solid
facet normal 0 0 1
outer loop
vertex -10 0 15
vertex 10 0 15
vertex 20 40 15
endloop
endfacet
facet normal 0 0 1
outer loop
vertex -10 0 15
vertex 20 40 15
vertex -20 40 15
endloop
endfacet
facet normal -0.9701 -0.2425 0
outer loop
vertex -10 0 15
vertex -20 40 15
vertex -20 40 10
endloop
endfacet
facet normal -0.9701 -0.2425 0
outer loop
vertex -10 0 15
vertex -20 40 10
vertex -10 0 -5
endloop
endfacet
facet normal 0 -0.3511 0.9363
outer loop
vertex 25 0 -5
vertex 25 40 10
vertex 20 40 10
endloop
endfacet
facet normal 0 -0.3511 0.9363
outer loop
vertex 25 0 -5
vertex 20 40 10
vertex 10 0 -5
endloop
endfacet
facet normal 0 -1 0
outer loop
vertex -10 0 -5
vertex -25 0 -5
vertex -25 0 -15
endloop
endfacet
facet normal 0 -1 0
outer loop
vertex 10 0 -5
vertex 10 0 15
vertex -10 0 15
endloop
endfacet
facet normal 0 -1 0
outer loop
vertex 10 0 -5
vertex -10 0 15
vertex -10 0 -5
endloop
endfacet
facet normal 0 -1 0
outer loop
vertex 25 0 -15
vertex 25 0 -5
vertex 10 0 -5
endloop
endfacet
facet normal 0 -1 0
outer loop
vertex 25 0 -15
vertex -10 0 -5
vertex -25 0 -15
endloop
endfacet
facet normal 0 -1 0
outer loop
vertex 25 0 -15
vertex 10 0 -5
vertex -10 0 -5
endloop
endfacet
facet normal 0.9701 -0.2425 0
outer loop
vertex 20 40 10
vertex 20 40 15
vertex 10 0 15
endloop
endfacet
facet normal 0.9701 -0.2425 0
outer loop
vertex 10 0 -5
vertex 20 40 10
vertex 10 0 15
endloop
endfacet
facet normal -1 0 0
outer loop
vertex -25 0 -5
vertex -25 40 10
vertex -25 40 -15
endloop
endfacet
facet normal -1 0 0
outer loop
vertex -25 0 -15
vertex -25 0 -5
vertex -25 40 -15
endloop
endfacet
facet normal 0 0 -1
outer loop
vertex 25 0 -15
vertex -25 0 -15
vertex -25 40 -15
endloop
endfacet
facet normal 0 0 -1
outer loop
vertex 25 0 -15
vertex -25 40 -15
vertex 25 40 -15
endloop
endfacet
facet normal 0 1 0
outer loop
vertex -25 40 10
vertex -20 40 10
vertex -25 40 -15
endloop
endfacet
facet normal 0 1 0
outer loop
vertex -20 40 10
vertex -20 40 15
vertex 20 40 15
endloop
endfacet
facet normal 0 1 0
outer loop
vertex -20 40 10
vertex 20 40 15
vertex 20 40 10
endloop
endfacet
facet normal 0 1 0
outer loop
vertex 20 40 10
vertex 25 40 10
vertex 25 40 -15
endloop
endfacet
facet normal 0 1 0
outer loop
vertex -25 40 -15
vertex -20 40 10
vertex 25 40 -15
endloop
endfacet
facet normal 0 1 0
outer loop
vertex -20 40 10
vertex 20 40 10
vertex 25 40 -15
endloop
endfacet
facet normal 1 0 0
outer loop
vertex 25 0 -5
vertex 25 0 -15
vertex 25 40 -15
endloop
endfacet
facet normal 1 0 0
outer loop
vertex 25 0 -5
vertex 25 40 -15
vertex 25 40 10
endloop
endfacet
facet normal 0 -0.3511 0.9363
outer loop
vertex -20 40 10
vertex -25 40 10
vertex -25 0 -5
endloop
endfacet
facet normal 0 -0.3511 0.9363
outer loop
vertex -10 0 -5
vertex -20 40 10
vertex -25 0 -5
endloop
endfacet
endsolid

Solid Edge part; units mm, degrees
sketch "Sketch1" plane through (0, 0, 0) normal (0, -1, 0) x (1, 0, 0)
  line L0 (10, 15) -> (-10, 15)
  line L1 (-10, -5) -> (-10, 15)
  line L2 (-10, -5) -> (-25, -5)
  line L3 (-25, -5) -> (-25, -15)
  line L4 (-25, -15) -> (25, -15)
  line L5 (25, -15) -> (25, -5)
  line L6 (10, -5) -> (25, -5)
  line L7 (10, -5) -> (10, 15)
extrude "Protrusion1" add sketch "Sketch1" against normal blind 40
sketch "Sketch2" plane through (25, 20, -10) normal (1, 0, 0) x (0, 1, 0)
  line L0 (20, 20) -> (-20, 5)
  line L1 (-20, 5) -> (20, 5)
  line L2 (20, 5) -> (20, 20)
extrude "ExtrudedProtrusion_3" add sketch "Sketch2" against normal blind 15
sketch "Sketch3" plane through (-25, 20, -10) normal (-1, 0, 0) x (0, -1, 0)
  line L0 (-20, 20) -> (20, 5)
  line L1 (20, 5) -> (-20, 5)
  line L2 (-20, 5) -> (-20, 20)
extrude "ExtrudedProtrusion_5" add sketch "Sketch3" against normal blind 15
sketch "Sketch4" plane through (0, 20, 15) normal (0, 0, 1) x (0, -1, 0)
  line L0 (-20, -20) -> (20, -10)
  line L1 (-20, -10) -> (-20, -20)
extrude "ExtrudedProtrusion_6" add sketch "Sketch4" against normal blind 20 material side at (-14.9515, 20.0121, 15)
sketch "Sketch5" plane through (0, 20, 15) normal (0, 0, 1) x (0, -1, 0)
  line L0 (-20, 20) -> (20, 10)
  line L1 (-20, 10) -> (-20, 20)
extrude "ExtrudedProtrusion_7" add sketch "Sketch5" against normal blind 20 material side at (14.9515, 20.0121, 15)
